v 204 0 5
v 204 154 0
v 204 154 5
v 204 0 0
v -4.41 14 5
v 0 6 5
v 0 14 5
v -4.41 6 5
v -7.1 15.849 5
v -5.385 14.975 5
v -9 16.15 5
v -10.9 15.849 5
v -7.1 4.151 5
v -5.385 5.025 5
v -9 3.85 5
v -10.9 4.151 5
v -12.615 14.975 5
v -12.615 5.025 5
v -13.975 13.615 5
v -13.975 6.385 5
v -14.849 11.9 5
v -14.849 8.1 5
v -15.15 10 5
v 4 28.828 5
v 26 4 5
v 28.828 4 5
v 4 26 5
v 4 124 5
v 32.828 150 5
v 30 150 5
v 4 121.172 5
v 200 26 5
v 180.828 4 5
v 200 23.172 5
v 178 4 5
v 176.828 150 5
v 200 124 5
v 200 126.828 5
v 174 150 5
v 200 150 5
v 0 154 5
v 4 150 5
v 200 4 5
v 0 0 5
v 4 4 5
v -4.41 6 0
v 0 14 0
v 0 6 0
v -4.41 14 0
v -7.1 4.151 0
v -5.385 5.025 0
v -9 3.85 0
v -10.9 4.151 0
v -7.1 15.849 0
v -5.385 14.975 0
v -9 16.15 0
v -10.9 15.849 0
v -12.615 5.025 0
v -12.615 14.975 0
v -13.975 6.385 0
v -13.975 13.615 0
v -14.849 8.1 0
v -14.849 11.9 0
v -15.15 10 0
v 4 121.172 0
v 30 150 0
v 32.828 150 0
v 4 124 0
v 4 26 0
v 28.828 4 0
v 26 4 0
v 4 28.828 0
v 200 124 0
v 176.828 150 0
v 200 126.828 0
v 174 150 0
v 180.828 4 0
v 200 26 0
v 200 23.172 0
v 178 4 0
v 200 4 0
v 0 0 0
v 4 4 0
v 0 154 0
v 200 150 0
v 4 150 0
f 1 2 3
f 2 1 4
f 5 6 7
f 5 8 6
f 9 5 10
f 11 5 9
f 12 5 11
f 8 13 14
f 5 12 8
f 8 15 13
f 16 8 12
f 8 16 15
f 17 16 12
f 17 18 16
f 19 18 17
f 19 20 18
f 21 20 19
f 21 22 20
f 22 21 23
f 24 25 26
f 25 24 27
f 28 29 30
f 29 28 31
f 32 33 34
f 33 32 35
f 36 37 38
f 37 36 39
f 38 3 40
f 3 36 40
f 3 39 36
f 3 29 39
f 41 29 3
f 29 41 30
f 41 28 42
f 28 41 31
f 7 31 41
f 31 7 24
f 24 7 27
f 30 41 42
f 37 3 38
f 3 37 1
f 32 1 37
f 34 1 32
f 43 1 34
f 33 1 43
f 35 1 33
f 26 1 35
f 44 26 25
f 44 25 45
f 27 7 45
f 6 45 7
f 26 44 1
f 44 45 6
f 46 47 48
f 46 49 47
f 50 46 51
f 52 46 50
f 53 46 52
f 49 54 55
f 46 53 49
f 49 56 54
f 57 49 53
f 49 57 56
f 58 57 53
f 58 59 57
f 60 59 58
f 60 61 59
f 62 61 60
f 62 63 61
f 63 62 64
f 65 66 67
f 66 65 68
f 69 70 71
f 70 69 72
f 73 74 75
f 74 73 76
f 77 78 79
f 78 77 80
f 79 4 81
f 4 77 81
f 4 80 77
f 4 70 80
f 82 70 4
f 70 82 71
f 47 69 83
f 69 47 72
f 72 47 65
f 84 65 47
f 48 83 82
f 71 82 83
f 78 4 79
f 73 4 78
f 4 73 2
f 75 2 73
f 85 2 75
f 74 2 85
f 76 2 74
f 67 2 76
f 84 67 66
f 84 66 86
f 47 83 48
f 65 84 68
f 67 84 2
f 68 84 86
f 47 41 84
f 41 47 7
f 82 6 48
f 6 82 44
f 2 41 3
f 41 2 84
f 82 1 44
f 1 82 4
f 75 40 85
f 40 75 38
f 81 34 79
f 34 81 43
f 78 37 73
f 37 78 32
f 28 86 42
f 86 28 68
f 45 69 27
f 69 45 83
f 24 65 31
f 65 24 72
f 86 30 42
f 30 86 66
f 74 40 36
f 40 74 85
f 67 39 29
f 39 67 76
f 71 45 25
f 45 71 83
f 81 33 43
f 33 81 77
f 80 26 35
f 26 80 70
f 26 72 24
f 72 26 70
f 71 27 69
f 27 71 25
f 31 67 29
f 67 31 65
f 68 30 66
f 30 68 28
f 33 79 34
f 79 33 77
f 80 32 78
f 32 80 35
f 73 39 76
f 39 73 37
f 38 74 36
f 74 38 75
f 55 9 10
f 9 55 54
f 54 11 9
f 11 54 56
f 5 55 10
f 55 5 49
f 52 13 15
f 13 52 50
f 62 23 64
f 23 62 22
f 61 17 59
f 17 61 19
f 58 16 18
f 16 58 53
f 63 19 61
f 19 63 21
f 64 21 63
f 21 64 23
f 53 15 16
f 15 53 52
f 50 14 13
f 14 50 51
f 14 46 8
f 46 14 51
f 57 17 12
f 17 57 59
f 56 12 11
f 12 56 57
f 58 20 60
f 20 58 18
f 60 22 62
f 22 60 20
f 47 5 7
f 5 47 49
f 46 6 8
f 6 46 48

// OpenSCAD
union() {
difference() {
  cube([204,154,5]);
  translate([4,4,-0.1]) cube([196,146,5.2]);
}

intersection() {
  cube([204,154,5]);
  union() {
    translate([30,0,0]) rotate([0,0,45]) cube([2,100,5]);
    translate([0,150-30,0]) rotate([0,0,-45]) cube([2,100,5]);

    translate([204-30,0,0]) rotate([0,0,-45]) cube([2,100,5]);
    translate([204,150-30,0]) rotate([0,0,45]) cube([2,100,5]);
  }
}

rotate([0,0,90]) mirror([0,1,0]) translate([10,-9,0]) {
  cylinder(r=6.15,h=5);
  translate([-4,4.15,0]) cube([8,5,5]);
}
}
